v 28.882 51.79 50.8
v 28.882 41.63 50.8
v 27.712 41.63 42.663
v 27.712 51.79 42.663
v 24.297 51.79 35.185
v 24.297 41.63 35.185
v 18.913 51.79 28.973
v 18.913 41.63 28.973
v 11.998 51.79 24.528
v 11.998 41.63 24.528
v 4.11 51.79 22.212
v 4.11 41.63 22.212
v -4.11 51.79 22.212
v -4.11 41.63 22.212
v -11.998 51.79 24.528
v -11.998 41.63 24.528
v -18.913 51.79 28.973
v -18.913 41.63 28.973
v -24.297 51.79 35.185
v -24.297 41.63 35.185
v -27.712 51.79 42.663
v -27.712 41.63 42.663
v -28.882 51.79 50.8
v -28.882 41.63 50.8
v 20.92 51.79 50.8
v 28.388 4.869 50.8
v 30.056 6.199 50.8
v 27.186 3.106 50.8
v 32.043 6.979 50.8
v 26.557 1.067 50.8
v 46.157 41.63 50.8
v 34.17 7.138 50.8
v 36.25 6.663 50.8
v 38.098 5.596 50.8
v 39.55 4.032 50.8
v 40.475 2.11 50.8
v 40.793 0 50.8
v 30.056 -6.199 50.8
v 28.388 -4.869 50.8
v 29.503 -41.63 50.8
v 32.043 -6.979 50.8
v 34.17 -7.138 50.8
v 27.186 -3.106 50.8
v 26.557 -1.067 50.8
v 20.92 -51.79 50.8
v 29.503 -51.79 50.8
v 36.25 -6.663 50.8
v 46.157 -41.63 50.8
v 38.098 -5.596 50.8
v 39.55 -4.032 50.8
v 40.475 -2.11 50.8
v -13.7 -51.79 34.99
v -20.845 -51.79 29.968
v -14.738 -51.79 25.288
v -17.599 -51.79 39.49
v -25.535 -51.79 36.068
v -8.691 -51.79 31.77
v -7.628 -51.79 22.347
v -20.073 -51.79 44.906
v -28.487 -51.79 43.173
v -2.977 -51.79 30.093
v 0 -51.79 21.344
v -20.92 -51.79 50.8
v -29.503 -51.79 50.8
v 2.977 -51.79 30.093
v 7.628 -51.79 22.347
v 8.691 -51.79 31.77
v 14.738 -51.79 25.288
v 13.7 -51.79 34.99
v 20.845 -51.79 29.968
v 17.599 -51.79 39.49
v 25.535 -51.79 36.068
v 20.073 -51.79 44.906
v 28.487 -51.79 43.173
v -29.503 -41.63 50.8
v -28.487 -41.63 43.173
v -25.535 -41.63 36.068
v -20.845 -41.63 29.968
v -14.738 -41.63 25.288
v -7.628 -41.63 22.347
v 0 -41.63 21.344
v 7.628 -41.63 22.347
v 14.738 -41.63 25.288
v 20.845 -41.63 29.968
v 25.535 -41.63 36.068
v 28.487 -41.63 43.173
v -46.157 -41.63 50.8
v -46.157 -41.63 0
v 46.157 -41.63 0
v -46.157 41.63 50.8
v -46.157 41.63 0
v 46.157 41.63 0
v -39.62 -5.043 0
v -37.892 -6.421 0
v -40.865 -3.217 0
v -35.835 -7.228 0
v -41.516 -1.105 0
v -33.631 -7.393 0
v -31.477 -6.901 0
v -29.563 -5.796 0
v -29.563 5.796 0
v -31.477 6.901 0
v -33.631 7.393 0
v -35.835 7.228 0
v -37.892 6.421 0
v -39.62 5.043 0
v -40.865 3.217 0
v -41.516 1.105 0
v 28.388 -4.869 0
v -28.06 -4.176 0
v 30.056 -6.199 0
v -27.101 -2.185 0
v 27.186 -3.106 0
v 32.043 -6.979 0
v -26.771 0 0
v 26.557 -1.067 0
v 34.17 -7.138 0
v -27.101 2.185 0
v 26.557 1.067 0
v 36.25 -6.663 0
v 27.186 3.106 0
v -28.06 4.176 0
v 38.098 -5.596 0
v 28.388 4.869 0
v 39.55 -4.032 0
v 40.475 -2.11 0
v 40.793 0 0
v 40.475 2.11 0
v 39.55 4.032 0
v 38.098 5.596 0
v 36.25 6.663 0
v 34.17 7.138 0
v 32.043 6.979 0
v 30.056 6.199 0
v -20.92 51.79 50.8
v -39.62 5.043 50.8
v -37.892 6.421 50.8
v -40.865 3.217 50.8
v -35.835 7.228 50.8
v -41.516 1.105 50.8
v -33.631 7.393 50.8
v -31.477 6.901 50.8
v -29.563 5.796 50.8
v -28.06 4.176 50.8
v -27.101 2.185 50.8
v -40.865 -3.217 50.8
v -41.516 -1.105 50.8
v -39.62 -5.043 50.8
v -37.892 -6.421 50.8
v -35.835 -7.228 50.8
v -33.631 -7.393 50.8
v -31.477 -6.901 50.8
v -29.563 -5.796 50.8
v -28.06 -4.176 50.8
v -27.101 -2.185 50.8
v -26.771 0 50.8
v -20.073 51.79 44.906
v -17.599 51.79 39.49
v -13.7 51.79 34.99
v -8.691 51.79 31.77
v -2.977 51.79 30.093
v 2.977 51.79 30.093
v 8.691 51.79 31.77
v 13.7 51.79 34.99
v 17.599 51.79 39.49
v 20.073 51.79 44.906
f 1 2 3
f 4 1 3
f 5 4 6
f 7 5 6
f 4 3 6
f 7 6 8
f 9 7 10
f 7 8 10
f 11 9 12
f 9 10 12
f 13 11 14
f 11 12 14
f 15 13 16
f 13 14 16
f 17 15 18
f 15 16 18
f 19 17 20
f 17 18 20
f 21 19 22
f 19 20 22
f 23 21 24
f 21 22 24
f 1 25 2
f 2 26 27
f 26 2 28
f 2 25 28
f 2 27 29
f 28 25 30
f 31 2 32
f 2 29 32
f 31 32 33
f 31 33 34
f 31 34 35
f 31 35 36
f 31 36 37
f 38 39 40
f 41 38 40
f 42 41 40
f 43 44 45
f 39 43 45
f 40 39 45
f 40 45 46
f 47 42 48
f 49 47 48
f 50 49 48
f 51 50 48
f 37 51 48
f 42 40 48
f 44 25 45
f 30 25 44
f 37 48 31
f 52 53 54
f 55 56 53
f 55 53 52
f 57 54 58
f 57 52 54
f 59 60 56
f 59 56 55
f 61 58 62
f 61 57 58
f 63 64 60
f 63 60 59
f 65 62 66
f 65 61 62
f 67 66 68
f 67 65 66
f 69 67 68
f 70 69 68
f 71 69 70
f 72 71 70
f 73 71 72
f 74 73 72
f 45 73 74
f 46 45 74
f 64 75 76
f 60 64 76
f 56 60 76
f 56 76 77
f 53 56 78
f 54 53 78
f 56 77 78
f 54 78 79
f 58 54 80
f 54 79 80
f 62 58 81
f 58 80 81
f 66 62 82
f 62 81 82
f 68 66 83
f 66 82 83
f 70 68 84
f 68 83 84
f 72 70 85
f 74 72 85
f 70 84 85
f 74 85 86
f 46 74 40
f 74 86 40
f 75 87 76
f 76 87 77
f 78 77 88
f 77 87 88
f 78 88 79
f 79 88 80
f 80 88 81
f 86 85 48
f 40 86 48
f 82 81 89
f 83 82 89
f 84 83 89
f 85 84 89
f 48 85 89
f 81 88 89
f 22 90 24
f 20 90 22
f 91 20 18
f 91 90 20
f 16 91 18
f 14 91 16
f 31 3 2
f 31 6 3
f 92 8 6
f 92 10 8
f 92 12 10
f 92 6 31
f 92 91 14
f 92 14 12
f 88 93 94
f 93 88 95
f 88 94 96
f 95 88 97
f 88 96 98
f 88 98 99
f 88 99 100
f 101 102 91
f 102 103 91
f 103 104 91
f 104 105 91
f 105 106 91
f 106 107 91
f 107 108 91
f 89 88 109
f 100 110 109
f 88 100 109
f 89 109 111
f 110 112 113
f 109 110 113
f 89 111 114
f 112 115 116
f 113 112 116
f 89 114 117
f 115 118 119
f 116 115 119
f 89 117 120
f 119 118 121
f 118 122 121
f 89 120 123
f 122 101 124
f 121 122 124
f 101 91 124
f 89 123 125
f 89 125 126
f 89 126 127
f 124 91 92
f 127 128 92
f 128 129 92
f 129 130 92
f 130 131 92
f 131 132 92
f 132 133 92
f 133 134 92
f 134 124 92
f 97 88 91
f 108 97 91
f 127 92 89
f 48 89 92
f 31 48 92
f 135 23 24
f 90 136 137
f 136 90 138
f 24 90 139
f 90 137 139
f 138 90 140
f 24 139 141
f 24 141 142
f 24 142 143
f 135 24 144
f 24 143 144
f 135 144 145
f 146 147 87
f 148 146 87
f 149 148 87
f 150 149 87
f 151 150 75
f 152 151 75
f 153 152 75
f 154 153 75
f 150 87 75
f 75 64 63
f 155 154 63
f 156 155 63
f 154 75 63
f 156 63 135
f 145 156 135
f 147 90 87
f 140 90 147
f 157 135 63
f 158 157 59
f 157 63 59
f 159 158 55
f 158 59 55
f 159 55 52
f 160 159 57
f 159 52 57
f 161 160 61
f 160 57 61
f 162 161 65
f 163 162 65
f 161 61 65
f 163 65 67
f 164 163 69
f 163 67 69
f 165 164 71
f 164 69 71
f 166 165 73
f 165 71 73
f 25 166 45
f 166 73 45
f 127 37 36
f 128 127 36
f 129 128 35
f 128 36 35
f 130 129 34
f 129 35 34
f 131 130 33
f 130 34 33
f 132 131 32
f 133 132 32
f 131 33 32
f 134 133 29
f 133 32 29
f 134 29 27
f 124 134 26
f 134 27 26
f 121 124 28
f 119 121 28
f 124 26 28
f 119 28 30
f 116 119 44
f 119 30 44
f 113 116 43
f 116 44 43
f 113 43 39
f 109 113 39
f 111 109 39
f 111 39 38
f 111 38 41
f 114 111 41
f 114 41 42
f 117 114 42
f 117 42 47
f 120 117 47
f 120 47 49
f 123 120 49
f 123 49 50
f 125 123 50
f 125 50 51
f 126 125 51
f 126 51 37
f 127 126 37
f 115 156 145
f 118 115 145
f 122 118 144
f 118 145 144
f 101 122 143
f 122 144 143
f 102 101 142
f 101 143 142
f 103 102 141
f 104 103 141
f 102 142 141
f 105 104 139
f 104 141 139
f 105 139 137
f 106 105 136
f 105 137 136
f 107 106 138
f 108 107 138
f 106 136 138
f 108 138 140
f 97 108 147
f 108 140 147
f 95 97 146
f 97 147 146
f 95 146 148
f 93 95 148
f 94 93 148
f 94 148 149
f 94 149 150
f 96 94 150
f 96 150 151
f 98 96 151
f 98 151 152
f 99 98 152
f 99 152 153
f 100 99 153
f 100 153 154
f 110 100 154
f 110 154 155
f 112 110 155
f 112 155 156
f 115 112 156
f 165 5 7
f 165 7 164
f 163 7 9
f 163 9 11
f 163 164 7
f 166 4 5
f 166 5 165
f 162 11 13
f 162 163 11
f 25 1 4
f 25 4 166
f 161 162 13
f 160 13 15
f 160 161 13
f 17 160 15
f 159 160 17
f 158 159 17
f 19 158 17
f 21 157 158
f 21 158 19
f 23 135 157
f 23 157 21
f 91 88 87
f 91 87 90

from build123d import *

# Parameters (mm, degrees)
F0_W     = 92.31437
F0_H     = 83.259412
F1_DEPTH = 50.8
F4_DEPTH = 127
F5_DEPTH = 10.16
F7_DEPTH = 10.16
F8_R     = 7.158054
F8_R_2   = 7.413985
F9_DEPTH = 152.4


with BuildPart() as f1:
    # F0 (on Top) → F1 (new body)
    with BuildSketch(Plane.XY):
        Rectangle(F0_W, F0_H)
    extrude(amount=F1_DEPTH)

    # F2 (on face) → F4 (cut)
    with BuildSketch(Plane.XZ.offset(41.629706)):
        with BuildLine():
            Line((20.920252, 50.8), (-20.920252, 50.8))
            ThreePointArc((-20.920252, 50.8), (0, 29.879748), (20.920252, 50.8))
        make_face()
    extrude(amount=-F4_DEPTH, mode=Mode.SUBTRACT)

    # F3 (on face) → F5 (join)
    with BuildSketch(Plane.XZ.offset(41.629706)):
        with BuildLine():
            Line((-20.920252, 50.8), (-29.502509, 50.8))
            ThreePointArc((-29.502509, 50.8), (0, 21.343507), (29.502509, 50.8))
            Line((29.502509, 50.8), (20.920252, 50.8))
            ThreePointArc((20.920252, 50.8), (0, 29.879748), (-20.920252, 50.8))
        make_face()
    extrude(amount=F5_DEPTH)

    # F6 (on face) → F7 (join)
    with BuildSketch(Plane(origin=(0, 41.629706, 0), x_dir=(-1, 0, 0), z_dir=(0, 1, 0))):
        with BuildLine():
            Line((-20.920252, 50.8), (-28.88168, 50.8))
            ThreePointArc((-28.88168, 50.8), (0, 21.91832), (28.88168, 50.8))
            Line((28.88168, 50.8), (20.920252, 50.8))
            ThreePointArc((20.920252, 50.8), (0, 29.879748), (-20.920252, 50.8))
        make_face()
    extrude(amount=F7_DEPTH)

    # F8 (on face) → F9 (cut)
    with BuildSketch(Plane.XY.offset(50.8)):
        with Locations((33.635359, 0)):
            Circle(F8_R)
        with Locations((-34.185261, 0)):
            Circle(F8_R_2)
    extrude(amount=-F9_DEPTH, mode=Mode.SUBTRACT)


solid = f1.part
